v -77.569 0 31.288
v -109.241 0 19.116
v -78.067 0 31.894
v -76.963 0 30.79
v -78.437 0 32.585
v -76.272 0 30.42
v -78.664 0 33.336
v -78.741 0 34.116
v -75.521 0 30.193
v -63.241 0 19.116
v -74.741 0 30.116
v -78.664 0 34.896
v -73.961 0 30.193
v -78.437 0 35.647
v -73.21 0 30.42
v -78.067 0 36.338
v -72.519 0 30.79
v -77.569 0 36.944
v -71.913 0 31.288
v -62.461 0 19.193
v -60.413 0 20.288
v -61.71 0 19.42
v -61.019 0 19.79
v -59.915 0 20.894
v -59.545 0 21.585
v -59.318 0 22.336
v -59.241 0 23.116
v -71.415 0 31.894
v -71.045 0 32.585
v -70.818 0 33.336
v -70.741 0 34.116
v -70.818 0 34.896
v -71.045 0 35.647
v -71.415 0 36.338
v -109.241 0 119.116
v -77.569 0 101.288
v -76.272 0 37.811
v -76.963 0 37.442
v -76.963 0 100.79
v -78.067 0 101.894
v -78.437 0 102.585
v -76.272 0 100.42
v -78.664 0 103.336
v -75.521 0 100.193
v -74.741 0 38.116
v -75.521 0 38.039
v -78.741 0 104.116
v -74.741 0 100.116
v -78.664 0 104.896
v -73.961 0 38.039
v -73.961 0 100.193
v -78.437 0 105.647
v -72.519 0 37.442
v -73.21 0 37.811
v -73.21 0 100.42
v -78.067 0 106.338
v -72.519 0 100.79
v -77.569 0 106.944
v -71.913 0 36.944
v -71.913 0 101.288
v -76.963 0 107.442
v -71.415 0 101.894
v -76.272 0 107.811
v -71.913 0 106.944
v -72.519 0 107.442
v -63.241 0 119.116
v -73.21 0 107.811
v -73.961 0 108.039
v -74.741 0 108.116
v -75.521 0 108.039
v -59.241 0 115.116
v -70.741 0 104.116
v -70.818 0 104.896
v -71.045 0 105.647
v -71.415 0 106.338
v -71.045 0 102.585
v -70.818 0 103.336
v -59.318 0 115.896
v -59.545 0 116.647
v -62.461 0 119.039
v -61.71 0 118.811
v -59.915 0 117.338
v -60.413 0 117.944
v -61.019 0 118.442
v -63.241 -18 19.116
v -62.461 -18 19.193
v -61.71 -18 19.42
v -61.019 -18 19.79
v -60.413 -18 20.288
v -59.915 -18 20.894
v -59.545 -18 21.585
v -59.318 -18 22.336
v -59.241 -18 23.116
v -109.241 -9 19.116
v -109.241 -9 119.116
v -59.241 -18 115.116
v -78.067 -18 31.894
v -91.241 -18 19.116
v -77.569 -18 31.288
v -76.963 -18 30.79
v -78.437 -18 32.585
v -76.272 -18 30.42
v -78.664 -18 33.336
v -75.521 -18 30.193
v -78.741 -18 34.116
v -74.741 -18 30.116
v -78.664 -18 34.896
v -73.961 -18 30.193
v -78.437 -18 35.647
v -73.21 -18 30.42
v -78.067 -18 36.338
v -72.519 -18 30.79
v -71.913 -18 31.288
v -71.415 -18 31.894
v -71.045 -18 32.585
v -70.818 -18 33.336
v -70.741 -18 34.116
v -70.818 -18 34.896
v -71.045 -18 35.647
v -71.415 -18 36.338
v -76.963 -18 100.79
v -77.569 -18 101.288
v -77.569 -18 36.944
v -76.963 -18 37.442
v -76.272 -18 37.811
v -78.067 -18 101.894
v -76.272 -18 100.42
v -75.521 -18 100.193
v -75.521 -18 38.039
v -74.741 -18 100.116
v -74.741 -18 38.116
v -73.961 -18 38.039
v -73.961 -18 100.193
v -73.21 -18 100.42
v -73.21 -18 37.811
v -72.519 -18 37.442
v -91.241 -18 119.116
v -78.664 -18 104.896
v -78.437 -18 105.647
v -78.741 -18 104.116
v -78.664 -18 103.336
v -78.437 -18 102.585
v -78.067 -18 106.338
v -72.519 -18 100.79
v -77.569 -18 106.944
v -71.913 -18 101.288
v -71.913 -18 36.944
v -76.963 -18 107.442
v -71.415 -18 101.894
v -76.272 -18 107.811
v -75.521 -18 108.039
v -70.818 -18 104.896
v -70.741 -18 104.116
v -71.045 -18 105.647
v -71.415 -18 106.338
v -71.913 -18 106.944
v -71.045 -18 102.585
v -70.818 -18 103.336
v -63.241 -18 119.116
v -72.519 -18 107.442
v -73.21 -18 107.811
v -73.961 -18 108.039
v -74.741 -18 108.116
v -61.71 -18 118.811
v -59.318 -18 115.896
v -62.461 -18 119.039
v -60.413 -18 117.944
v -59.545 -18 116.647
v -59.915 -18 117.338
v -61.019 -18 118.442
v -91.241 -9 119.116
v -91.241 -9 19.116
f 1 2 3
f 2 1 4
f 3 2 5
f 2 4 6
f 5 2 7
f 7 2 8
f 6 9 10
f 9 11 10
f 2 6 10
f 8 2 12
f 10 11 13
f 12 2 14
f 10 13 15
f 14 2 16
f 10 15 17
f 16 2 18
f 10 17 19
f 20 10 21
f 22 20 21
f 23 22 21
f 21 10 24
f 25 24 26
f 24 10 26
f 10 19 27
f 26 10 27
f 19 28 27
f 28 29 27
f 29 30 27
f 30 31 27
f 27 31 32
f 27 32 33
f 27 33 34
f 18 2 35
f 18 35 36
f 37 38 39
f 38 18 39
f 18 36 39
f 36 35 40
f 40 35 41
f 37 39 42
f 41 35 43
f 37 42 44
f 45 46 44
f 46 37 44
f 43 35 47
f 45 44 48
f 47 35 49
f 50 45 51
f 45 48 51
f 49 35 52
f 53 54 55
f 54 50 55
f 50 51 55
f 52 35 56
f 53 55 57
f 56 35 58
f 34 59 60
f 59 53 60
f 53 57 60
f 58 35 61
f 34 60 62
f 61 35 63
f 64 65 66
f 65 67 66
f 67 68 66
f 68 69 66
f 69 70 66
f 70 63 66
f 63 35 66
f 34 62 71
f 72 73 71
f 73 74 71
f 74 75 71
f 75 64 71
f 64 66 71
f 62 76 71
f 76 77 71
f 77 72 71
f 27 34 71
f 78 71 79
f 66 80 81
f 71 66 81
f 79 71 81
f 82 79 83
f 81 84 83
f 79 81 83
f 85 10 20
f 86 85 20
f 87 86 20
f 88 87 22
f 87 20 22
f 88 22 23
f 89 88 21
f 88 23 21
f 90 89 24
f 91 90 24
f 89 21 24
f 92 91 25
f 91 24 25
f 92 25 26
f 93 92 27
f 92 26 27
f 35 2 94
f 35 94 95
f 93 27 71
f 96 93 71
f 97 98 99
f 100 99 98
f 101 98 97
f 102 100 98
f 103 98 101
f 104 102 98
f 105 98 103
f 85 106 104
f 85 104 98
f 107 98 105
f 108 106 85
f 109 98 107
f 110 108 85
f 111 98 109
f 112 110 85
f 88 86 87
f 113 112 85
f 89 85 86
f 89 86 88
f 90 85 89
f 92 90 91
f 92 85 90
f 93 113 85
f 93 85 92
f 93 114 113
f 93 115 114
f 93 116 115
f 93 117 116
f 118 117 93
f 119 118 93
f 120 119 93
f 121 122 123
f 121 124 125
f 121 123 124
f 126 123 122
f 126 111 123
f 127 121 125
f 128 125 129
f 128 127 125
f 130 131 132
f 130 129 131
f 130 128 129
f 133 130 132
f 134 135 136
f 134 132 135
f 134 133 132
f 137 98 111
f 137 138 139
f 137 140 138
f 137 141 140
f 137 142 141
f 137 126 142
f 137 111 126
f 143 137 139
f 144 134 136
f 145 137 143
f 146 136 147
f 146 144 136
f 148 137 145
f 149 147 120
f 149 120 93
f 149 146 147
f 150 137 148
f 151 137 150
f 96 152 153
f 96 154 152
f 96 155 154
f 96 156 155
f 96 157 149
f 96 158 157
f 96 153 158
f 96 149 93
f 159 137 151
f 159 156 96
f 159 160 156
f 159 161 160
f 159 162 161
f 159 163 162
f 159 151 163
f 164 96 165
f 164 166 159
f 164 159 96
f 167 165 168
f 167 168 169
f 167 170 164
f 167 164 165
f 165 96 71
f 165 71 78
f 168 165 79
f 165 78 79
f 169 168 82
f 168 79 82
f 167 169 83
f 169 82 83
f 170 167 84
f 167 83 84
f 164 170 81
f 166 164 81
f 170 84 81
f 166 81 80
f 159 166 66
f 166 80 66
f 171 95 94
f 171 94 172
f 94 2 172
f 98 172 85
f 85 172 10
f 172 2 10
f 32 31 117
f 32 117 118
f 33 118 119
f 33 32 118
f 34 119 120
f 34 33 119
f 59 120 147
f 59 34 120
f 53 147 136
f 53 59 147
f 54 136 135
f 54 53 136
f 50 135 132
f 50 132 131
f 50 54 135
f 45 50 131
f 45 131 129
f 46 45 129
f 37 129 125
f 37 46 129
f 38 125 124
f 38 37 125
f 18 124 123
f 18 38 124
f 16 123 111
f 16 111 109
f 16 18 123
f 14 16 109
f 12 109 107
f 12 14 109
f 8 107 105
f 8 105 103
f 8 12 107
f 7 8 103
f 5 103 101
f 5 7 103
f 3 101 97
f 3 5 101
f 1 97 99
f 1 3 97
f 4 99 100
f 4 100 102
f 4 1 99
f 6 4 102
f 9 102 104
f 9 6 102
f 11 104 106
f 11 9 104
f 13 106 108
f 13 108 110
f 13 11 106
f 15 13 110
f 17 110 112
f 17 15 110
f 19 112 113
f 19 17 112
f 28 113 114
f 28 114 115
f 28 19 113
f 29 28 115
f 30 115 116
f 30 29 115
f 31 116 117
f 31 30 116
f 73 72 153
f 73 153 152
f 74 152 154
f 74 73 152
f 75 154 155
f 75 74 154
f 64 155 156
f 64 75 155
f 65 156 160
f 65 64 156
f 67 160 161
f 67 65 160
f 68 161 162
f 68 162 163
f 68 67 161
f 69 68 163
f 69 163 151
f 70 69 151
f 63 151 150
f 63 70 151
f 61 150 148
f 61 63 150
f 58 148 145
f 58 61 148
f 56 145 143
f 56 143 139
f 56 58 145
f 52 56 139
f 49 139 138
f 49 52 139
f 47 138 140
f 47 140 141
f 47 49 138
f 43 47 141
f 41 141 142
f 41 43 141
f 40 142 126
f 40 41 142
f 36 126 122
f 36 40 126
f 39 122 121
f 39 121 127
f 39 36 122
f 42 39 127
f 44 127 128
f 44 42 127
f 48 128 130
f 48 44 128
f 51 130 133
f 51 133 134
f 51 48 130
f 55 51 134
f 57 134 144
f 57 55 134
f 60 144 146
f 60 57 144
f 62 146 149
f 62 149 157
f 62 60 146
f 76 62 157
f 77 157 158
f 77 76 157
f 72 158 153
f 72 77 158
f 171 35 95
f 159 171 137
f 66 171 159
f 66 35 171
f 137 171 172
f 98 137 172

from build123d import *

# Parameters (mm, degrees)
F0_R     = 4
F1_DEPTH = 18
F0_W     = 18
F0_H     = 100
F2_DEPTH = 9


with BuildPart() as f1:
    # F0 (on Front) → F1 (new body)
    with BuildSketch(Plane.XZ):
        with BuildLine():
            Line((-59.240983, 23.115967), (-59.240983, 115.115967))
            ThreePointArc((-59.240983, 115.115967), (-60.412556, 117.944394), (-63.240983, 119.115967))
            Line((-63.240983, 119.115967), (-91.240983, 119.115967))
            Line((-91.240983, 119.115967), (-91.240983, 19.115967))
            Line((-91.240983, 19.115967), (-63.240983, 19.115967))
            ThreePointArc((-63.240983, 19.115967), (-60.412556, 20.287539), (-59.240983, 23.115967))
        make_face()
        with Locations((-74.740983, 34.115967)):
            Circle(F0_R, mode=Mode.SUBTRACT)
        with Locations((-74.740983, 104.115967)):
            Circle(F0_R, mode=Mode.SUBTRACT)
    extrude(amount=F1_DEPTH)

    # F0 (on Front) → F2 (join)
    with BuildSketch(Plane.XZ):
        with Locations((-100.240983, 69.115967)):
            Rectangle(F0_W, F0_H)
    extrude(amount=F2_DEPTH)


solid = f1.part
